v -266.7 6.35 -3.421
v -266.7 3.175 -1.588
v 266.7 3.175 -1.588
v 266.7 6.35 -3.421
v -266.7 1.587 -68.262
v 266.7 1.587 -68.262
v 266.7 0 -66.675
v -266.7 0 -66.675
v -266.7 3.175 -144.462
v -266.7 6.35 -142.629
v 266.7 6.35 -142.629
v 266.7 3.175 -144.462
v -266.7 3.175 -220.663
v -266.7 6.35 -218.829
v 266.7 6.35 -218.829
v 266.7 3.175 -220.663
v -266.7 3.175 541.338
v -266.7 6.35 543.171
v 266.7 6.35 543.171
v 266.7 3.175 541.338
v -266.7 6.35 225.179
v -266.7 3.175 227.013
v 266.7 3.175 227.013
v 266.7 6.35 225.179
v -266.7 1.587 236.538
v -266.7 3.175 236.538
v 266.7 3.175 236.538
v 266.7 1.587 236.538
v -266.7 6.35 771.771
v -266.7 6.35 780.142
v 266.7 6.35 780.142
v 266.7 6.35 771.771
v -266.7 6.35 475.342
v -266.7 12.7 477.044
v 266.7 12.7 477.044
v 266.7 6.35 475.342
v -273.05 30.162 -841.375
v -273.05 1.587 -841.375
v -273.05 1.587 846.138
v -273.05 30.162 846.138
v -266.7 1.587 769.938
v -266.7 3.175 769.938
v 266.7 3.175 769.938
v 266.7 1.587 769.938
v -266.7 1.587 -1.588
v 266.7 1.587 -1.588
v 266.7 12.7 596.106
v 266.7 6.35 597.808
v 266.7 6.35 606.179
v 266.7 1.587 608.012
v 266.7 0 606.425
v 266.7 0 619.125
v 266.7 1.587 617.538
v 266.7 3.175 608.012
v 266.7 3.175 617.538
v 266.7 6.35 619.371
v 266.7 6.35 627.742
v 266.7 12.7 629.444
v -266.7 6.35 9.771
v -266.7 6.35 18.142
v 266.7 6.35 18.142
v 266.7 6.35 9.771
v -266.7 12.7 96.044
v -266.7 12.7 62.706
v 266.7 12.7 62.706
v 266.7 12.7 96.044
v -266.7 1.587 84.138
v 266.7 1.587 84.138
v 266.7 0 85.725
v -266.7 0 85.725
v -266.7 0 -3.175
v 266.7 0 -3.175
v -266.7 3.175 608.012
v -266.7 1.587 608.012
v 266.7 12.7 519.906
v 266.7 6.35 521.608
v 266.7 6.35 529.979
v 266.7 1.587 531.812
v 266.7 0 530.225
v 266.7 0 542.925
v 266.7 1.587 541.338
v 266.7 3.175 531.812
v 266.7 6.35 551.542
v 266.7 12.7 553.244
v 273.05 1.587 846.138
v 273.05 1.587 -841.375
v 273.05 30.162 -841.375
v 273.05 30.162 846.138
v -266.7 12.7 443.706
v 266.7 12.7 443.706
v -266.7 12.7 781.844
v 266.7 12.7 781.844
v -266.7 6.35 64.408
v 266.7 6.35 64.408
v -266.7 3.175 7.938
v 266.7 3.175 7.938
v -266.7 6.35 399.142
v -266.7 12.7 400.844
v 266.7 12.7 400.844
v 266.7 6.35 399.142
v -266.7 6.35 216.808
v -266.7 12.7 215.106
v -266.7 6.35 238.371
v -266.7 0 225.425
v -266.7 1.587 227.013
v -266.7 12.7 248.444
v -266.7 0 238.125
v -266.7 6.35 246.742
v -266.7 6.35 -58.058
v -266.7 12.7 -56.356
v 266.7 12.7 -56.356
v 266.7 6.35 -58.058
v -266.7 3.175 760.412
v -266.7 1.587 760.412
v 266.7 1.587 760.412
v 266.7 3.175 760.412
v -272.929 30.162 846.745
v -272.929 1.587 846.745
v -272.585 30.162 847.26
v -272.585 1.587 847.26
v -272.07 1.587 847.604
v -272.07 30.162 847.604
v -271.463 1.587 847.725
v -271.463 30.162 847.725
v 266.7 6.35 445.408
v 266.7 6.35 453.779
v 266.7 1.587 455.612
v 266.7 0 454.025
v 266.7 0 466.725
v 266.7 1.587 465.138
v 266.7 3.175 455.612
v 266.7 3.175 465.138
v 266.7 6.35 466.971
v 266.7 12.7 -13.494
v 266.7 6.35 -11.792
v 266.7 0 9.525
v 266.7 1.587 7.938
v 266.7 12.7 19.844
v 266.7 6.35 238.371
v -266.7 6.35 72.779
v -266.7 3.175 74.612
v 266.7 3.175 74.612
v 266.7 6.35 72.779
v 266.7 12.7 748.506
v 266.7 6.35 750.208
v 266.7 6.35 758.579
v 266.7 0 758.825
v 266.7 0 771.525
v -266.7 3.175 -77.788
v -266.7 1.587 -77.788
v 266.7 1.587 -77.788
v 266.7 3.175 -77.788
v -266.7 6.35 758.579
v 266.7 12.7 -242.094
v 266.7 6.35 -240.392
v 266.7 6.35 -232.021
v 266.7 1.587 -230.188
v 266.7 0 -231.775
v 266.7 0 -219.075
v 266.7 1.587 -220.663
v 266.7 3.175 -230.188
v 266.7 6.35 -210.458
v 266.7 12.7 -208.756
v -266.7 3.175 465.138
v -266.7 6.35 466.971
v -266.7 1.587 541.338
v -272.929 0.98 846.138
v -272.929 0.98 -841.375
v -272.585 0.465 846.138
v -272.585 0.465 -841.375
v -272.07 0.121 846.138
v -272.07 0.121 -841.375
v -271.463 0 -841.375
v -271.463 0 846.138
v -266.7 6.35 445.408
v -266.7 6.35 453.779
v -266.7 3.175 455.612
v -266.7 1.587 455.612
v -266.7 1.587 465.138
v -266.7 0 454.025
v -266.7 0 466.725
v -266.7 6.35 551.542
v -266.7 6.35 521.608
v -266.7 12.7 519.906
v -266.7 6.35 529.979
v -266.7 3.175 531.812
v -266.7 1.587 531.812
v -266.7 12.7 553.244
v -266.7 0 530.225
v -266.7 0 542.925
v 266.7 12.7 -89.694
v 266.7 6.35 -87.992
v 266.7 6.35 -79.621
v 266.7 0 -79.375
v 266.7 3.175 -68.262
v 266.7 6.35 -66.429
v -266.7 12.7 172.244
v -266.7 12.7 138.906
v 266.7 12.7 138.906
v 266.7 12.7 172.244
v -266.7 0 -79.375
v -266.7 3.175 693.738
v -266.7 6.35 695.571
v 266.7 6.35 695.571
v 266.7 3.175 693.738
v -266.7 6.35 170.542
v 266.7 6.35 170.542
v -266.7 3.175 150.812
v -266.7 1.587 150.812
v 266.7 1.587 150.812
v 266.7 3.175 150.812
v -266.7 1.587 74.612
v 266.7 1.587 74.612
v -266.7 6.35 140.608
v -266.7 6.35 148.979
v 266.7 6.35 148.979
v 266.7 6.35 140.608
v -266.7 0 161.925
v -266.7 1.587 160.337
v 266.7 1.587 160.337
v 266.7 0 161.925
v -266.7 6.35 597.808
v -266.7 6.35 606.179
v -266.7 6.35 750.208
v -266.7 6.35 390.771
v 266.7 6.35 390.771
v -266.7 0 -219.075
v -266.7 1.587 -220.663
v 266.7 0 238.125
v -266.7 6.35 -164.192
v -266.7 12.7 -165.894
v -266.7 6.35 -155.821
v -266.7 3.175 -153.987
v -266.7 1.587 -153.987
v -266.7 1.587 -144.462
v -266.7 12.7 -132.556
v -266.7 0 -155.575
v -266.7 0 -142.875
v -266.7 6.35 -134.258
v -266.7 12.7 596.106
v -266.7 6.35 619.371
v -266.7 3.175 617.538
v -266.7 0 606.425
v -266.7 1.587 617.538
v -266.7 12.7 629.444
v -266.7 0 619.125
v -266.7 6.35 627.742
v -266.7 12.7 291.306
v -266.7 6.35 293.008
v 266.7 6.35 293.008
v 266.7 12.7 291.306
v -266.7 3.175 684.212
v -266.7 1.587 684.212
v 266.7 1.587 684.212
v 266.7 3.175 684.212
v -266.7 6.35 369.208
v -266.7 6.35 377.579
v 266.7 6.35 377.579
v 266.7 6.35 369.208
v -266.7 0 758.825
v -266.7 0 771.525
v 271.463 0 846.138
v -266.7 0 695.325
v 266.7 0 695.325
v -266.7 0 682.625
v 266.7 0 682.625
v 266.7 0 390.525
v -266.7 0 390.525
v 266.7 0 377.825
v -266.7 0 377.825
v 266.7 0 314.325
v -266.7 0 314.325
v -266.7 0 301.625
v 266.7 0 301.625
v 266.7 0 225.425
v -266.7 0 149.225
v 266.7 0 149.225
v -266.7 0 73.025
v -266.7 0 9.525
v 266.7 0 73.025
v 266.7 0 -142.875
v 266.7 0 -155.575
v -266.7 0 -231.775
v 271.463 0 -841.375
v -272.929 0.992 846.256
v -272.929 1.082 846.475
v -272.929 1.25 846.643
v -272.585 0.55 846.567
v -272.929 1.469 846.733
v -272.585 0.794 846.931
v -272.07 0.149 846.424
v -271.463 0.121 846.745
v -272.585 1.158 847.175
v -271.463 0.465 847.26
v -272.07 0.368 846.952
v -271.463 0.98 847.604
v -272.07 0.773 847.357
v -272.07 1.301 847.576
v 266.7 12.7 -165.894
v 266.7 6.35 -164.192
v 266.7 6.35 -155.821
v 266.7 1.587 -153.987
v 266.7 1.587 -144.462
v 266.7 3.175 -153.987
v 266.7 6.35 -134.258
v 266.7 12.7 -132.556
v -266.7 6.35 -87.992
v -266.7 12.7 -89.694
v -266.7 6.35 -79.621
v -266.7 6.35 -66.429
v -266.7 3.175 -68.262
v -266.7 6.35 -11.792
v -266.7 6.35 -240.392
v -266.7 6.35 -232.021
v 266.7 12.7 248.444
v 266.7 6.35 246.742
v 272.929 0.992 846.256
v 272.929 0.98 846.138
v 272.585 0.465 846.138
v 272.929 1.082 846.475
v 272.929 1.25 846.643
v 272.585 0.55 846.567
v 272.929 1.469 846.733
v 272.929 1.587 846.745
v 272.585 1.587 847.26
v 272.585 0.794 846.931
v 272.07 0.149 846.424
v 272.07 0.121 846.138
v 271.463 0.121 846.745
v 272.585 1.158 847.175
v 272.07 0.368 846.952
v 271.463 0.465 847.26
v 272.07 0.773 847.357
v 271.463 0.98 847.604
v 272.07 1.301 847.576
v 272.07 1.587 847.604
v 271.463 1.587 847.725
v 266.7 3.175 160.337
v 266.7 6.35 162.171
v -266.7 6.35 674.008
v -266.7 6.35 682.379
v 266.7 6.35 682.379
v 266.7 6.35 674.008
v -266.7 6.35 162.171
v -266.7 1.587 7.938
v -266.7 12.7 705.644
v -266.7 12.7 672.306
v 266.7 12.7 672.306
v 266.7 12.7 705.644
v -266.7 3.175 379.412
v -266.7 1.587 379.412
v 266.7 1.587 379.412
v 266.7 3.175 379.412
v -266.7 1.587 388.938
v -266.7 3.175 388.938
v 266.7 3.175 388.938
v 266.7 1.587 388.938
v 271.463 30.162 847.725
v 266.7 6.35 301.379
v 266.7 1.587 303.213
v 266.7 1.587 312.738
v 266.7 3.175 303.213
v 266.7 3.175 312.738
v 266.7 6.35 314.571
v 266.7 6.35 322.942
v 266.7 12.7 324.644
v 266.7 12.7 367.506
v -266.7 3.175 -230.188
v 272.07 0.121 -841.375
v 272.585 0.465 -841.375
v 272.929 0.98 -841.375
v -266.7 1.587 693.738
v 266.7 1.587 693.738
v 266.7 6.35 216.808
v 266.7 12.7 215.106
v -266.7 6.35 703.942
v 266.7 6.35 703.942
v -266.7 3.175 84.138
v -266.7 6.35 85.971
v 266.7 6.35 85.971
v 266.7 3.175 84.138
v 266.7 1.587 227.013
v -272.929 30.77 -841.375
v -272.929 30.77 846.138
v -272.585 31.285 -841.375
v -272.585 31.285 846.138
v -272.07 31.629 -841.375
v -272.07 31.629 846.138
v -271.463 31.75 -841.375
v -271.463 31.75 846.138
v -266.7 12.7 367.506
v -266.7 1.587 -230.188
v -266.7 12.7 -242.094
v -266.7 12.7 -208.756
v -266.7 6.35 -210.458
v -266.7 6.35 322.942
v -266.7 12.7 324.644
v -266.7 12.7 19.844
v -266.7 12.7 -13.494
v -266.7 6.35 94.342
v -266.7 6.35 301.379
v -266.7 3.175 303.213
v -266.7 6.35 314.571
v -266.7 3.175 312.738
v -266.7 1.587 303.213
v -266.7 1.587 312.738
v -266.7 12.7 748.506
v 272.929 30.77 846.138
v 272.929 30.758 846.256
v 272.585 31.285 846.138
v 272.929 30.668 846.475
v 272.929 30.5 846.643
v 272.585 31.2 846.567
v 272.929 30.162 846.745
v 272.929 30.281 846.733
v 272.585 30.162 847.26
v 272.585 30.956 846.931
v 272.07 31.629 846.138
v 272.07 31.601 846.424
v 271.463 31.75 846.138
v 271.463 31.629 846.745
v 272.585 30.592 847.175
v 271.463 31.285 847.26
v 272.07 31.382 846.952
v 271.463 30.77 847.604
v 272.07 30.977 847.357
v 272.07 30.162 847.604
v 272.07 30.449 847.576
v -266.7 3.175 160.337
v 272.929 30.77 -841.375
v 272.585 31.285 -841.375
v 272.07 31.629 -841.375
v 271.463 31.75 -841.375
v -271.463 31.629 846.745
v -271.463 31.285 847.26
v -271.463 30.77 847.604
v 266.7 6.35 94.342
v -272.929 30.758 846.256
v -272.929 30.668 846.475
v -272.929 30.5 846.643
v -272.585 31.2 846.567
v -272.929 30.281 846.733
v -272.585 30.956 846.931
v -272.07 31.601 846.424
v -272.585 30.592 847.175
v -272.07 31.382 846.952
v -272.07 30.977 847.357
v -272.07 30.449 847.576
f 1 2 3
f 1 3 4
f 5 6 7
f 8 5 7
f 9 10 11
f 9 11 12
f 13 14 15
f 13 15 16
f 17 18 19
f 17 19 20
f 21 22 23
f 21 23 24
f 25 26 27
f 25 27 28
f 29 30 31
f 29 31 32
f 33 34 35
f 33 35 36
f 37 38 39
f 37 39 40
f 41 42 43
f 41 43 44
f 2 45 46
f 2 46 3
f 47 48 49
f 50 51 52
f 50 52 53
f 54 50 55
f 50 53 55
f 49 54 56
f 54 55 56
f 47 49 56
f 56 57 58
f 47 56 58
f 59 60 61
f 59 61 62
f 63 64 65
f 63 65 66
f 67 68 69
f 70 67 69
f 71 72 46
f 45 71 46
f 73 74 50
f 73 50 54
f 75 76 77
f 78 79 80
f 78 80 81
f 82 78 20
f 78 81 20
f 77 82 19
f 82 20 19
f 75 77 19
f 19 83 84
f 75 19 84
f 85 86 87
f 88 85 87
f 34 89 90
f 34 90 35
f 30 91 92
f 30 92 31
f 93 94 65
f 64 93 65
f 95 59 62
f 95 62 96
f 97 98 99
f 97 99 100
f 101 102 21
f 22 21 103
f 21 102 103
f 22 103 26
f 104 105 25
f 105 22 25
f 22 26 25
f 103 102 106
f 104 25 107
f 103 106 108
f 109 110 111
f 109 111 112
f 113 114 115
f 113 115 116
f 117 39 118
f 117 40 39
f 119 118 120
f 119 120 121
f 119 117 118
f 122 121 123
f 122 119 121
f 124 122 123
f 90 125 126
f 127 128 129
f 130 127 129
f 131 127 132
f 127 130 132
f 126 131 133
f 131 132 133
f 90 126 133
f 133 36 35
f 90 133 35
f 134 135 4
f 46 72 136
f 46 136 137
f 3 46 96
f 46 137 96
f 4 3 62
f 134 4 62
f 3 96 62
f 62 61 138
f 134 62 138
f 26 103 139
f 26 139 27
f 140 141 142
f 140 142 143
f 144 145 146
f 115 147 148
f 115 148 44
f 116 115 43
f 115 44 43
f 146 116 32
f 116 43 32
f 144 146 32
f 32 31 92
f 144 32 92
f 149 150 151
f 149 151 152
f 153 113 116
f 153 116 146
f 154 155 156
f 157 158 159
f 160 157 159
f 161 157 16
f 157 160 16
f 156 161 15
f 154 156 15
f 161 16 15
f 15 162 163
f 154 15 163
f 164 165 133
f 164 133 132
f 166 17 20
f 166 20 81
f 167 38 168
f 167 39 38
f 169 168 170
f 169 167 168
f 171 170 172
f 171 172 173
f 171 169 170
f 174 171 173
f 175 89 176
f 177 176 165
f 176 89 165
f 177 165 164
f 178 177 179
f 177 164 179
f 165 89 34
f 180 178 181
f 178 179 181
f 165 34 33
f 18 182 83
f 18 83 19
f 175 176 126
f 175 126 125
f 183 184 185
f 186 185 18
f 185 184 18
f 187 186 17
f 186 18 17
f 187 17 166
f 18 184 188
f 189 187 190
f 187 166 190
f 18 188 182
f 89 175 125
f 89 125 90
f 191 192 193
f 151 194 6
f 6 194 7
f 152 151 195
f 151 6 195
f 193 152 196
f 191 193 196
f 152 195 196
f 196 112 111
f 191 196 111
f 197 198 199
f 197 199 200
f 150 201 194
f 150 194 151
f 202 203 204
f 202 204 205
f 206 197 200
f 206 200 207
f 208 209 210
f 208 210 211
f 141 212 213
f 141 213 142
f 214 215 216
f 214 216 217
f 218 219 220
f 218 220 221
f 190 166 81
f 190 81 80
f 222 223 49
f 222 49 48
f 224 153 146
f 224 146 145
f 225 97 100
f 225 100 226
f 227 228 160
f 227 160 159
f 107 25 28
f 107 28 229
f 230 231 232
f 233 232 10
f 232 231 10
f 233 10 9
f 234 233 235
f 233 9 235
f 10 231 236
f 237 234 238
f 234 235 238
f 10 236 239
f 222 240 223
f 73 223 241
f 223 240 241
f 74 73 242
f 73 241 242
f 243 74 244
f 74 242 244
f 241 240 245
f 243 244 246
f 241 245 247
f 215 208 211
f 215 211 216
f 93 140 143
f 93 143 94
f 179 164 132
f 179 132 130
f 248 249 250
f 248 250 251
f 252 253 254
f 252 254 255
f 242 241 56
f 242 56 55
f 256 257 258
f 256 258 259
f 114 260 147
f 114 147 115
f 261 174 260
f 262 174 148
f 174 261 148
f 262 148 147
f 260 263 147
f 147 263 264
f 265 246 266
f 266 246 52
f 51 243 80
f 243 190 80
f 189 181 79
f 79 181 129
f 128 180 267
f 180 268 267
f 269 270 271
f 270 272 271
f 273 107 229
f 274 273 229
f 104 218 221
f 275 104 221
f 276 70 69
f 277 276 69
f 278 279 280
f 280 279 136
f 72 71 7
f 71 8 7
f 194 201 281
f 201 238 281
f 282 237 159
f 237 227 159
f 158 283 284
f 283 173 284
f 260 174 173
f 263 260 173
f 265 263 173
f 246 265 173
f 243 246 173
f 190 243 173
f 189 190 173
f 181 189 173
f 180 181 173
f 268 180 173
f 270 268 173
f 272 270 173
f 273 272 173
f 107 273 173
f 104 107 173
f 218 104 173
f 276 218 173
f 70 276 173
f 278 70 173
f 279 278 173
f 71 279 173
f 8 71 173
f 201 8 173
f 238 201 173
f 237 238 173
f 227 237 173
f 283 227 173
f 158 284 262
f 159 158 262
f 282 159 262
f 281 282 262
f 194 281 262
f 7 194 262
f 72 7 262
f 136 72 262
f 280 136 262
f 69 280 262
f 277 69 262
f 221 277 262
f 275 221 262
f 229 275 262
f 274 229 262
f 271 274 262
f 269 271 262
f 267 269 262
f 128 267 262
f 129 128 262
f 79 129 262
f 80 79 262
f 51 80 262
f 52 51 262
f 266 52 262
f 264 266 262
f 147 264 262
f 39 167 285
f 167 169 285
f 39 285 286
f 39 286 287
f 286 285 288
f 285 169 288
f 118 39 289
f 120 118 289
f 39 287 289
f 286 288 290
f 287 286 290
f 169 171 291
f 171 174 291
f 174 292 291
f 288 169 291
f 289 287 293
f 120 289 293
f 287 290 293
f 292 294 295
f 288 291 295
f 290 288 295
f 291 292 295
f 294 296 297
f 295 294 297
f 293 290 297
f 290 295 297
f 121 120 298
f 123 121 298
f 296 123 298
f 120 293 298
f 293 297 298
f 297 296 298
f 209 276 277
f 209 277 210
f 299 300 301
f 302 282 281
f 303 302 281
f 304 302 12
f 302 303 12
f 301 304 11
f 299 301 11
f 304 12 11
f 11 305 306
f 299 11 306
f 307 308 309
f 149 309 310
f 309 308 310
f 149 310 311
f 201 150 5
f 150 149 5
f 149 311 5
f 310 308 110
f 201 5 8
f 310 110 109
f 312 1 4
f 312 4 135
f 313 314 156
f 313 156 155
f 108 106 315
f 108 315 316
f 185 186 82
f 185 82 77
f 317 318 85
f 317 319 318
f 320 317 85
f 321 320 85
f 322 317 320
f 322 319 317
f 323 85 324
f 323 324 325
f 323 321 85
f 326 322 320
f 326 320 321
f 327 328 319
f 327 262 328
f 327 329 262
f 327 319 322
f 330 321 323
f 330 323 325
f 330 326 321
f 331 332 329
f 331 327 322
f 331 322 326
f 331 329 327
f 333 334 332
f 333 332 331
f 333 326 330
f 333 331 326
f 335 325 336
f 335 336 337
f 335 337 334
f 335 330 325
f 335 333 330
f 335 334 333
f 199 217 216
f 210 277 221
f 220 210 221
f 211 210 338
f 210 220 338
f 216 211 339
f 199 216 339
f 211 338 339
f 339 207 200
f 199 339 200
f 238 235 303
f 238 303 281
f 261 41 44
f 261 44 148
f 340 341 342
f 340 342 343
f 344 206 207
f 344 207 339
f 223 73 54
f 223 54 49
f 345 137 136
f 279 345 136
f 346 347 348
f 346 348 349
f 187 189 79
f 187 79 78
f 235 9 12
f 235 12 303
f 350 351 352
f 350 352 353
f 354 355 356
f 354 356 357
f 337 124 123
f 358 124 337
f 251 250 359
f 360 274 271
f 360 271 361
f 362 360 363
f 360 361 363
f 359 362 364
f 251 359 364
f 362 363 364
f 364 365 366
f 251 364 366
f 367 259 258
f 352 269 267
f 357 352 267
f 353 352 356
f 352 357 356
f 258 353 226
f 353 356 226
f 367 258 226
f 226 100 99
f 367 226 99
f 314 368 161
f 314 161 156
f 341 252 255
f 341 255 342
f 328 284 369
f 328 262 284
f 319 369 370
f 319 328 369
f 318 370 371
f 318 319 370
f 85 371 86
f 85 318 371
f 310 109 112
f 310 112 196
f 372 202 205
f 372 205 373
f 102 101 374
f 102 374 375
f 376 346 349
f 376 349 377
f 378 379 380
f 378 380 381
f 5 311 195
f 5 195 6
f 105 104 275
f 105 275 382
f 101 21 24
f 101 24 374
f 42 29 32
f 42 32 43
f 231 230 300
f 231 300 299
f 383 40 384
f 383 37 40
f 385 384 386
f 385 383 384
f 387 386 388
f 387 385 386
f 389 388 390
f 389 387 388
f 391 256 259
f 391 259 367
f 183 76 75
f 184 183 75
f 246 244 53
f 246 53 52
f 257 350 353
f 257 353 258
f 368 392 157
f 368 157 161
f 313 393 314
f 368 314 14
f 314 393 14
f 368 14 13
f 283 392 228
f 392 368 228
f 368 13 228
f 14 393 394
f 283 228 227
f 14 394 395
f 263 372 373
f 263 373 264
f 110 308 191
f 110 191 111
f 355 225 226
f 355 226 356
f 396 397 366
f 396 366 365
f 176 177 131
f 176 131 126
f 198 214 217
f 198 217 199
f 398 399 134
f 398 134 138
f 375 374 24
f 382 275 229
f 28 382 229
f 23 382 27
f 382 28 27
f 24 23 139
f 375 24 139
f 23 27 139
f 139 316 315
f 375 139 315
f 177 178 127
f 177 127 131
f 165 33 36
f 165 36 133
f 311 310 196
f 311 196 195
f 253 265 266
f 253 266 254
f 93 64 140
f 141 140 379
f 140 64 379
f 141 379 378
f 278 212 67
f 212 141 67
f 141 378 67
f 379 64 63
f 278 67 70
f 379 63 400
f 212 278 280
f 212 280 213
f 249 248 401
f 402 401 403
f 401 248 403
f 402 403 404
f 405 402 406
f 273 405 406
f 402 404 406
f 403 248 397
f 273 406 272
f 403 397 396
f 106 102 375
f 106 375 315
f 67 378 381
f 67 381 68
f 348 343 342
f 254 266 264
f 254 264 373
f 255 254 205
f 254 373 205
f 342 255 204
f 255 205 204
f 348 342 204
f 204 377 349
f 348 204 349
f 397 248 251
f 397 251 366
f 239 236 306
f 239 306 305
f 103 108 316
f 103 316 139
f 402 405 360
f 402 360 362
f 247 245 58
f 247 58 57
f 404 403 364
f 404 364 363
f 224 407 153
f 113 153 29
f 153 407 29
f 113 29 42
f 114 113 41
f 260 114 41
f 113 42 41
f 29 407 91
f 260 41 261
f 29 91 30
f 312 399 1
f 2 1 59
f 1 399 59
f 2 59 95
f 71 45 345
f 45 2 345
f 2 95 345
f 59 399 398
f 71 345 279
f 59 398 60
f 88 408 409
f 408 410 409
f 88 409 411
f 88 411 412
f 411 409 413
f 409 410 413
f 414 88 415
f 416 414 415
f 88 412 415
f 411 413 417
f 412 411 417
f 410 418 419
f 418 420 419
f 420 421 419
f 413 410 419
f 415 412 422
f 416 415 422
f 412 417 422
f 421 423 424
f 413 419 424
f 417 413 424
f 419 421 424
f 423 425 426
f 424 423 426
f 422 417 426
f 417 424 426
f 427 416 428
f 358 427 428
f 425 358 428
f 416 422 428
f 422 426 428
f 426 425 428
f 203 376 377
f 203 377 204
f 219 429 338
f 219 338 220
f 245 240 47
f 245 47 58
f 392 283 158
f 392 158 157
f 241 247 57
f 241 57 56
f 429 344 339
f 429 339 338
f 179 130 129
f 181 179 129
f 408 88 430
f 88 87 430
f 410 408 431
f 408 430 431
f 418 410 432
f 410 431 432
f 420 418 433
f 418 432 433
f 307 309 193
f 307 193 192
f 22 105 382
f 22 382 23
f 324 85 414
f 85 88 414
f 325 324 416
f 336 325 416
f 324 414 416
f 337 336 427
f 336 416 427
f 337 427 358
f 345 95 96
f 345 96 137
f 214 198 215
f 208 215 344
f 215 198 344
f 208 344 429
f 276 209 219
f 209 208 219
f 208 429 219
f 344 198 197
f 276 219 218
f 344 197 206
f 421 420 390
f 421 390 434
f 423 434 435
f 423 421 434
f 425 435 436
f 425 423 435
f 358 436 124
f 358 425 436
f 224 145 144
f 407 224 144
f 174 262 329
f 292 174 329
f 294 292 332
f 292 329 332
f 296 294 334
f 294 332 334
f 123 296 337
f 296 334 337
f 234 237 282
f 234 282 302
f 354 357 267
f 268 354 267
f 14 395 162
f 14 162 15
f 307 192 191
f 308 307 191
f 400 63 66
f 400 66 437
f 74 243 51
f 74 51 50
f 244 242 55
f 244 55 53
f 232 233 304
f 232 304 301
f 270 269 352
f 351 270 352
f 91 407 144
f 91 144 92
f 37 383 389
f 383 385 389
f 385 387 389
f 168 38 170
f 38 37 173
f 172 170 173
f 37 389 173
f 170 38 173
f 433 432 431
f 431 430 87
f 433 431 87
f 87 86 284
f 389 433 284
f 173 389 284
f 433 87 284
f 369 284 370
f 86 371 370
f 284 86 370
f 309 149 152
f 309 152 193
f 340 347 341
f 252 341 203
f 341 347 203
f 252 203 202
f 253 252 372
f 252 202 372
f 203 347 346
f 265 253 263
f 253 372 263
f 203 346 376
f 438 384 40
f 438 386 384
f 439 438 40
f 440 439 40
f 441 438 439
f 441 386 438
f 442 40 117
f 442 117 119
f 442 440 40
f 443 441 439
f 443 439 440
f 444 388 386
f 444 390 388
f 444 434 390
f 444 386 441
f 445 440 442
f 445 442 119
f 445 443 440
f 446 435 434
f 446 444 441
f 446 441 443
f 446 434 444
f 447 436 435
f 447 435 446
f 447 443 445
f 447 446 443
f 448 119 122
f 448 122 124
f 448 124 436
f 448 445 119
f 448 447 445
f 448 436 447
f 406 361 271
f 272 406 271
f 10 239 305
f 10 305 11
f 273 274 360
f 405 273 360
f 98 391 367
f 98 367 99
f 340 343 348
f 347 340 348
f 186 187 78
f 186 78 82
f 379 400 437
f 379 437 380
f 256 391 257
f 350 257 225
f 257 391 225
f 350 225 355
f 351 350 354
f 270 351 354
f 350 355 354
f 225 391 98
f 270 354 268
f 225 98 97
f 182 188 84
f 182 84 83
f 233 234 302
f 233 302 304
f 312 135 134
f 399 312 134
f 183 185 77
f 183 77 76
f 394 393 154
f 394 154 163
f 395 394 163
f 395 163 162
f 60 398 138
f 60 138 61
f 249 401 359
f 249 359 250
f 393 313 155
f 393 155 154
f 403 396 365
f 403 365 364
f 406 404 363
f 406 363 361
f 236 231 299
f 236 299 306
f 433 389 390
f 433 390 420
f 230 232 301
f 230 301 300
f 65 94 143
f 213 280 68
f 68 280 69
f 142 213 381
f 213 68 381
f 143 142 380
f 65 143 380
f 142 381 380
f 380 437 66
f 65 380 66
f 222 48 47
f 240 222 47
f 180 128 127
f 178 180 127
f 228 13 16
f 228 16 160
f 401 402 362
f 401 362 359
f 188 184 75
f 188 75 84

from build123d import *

# Parameters (mm, degrees)
F0_W      = 533.4
F0_H      = 1682.75
F1_DEPTH  = 31.75
F3_DEPTH  = 635
F21_W     = 31.75
F21_H     = 1682.75
F22_DEPTH = 6.35
F23_W     = 31.75
F23_H     = 1682.75
F24_DEPTH = 6.35
F25_W     = 546.1
F25_H     = 31.75
F26_DEPTH = 6.35
F27_R     = 1.5875


with BuildPart() as f1:
    # F0 (on Front) → F1 (new body)
    with BuildSketch(Plane.XZ):
        Rectangle(F0_W, F0_H)
    extrude(amount=-F1_DEPTH)


with BuildPart() as f3:
    # F2 (on face) → F3 (new body)
    with BuildSketch(Plane.YZ.offset(266.7)):
        Polygon((-6.35, -6.35), (-4.7625, -4.7625), (-3.175, -4.7625), (0, -6.5955926), (0, -14.9672802), (6.35, -16.66875), (6.35, 16.66875), (0, 14.9672548), (0, 6.5955672), (-3.175, 4.7625), (-4.7625, 4.7625), (-6.35, 6.35), align=None)
    extrude(amount=F3_DEPTH)


with BuildPart() as f6_1:
    # F6: copy of F3
    add(f3.part.moved(Location((-635, 6.35, -225.425))))


with BuildPart() as f7_1:
    # F7: copy of F3
    add(f3.part.moved(Location((-635, 6.35, -149.225))))


with BuildPart() as f8_1:
    # F8: copy of F3
    add(f3.part.moved(Location((-635, 6.35, -73.025))))


with BuildPart() as f9_1:
    # F9: copy of F3
    add(f3.part.moved(Location((-635, 6.35, 3.175))))


with BuildPart() as f10_1:
    # F10: copy of F3
    add(f3.part.moved(Location((-635, 6.35, 79.375))))


with BuildPart() as f11_1:
    # F11: copy of F3
    add(f3.part.moved(Location((-635, 6.35, 155.575))))


with BuildPart() as f12_1:
    # F12: copy of F3
    add(f3.part.moved(Location((-635, 6.35, 231.775))))


with BuildPart() as f13_1:
    # F13: copy of F3
    add(f3.part.moved(Location((-635, 6.35, 307.975))))


with BuildPart() as f14_1:
    # F14: copy of F3
    add(f3.part.moved(Location((-635, 6.35, 384.175))))


with BuildPart() as f15_1:
    # F15: copy of F3
    add(f3.part.moved(Location((-635, 6.35, 460.375))))


with BuildPart() as f16_1:
    # F16: copy of F3
    add(f3.part.moved(Location((-635, 6.35, 536.575))))


with BuildPart() as f17_1:
    # F17: copy of F3
    add(f3.part.moved(Location((-635, 6.35, 612.775))))


with BuildPart() as f18_1:
    # F18: copy of F3
    add(f3.part.moved(Location((-635, 6.35, 688.975))))


with BuildPart() as f3_1:
    # F19: moved
    add(f3.part.moved(Location((-635, 6.35, 765.175))))


with BuildPart() as f1_1:
    add(f1.part)

    # F20: cut F3, F18_1, F17_1, F16_1, F15_1, F14_1, F13_1, F12_1, F11_1, F10_1, F9_1, F8_1, F7_1, F6_1
    add(f3_1.part, mode=Mode.SUBTRACT)
    add(f18_1.part, mode=Mode.SUBTRACT)
    add(f17_1.part, mode=Mode.SUBTRACT)
    add(f16_1.part, mode=Mode.SUBTRACT)
    add(f15_1.part, mode=Mode.SUBTRACT)
    add(f14_1.part, mode=Mode.SUBTRACT)
    add(f13_1.part, mode=Mode.SUBTRACT)
    add(f12_1.part, mode=Mode.SUBTRACT)
    add(f11_1.part, mode=Mode.SUBTRACT)
    add(f10_1.part, mode=Mode.SUBTRACT)
    add(f9_1.part, mode=Mode.SUBTRACT)
    add(f8_1.part, mode=Mode.SUBTRACT)
    add(f7_1.part, mode=Mode.SUBTRACT)
    add(f6_1.part, mode=Mode.SUBTRACT)

    # F21 (on face) → F22 (join)
    with BuildSketch(Plane.YZ.offset(266.7)):
        with Locations((15.875, 0)):
            Rectangle(F21_W, F21_H)
    extrude(amount=F22_DEPTH)

    # F23 (on face) → F24 (join)
    with BuildSketch(Plane(origin=(-266.7, 0, 0), x_dir=(0, -1, 0), z_dir=(-1, 0, 0))):
        with Locations((-15.875, 0)):
            Rectangle(F23_W, F23_H)
    extrude(amount=F24_DEPTH)

    # F25 (on face) → F26 (join)
    with BuildSketch(Plane.XY.offset(841.375)):
        with Locations((0, 15.875)):
            Rectangle(F25_W, F25_H)
    extrude(amount=F26_DEPTH)

    # F27
    f27_edges = [f1_1.edges().sort_by_distance(p)[0] for p in [
        (0, 31.75, 847.725),
        (0, 0, 847.725),
        (-273.05, 31.75, 3.175),
        (-273.05, 0, 3.175),
        (273.05, 0, 3.175),
        (273.05, 31.75, 3.175),
        (273.05, 15.875, 847.725),
        (-273.05, 15.875, 847.725),
    ]]
    fillet(f27_edges, radius=F27_R)


solid = f1_1.part
